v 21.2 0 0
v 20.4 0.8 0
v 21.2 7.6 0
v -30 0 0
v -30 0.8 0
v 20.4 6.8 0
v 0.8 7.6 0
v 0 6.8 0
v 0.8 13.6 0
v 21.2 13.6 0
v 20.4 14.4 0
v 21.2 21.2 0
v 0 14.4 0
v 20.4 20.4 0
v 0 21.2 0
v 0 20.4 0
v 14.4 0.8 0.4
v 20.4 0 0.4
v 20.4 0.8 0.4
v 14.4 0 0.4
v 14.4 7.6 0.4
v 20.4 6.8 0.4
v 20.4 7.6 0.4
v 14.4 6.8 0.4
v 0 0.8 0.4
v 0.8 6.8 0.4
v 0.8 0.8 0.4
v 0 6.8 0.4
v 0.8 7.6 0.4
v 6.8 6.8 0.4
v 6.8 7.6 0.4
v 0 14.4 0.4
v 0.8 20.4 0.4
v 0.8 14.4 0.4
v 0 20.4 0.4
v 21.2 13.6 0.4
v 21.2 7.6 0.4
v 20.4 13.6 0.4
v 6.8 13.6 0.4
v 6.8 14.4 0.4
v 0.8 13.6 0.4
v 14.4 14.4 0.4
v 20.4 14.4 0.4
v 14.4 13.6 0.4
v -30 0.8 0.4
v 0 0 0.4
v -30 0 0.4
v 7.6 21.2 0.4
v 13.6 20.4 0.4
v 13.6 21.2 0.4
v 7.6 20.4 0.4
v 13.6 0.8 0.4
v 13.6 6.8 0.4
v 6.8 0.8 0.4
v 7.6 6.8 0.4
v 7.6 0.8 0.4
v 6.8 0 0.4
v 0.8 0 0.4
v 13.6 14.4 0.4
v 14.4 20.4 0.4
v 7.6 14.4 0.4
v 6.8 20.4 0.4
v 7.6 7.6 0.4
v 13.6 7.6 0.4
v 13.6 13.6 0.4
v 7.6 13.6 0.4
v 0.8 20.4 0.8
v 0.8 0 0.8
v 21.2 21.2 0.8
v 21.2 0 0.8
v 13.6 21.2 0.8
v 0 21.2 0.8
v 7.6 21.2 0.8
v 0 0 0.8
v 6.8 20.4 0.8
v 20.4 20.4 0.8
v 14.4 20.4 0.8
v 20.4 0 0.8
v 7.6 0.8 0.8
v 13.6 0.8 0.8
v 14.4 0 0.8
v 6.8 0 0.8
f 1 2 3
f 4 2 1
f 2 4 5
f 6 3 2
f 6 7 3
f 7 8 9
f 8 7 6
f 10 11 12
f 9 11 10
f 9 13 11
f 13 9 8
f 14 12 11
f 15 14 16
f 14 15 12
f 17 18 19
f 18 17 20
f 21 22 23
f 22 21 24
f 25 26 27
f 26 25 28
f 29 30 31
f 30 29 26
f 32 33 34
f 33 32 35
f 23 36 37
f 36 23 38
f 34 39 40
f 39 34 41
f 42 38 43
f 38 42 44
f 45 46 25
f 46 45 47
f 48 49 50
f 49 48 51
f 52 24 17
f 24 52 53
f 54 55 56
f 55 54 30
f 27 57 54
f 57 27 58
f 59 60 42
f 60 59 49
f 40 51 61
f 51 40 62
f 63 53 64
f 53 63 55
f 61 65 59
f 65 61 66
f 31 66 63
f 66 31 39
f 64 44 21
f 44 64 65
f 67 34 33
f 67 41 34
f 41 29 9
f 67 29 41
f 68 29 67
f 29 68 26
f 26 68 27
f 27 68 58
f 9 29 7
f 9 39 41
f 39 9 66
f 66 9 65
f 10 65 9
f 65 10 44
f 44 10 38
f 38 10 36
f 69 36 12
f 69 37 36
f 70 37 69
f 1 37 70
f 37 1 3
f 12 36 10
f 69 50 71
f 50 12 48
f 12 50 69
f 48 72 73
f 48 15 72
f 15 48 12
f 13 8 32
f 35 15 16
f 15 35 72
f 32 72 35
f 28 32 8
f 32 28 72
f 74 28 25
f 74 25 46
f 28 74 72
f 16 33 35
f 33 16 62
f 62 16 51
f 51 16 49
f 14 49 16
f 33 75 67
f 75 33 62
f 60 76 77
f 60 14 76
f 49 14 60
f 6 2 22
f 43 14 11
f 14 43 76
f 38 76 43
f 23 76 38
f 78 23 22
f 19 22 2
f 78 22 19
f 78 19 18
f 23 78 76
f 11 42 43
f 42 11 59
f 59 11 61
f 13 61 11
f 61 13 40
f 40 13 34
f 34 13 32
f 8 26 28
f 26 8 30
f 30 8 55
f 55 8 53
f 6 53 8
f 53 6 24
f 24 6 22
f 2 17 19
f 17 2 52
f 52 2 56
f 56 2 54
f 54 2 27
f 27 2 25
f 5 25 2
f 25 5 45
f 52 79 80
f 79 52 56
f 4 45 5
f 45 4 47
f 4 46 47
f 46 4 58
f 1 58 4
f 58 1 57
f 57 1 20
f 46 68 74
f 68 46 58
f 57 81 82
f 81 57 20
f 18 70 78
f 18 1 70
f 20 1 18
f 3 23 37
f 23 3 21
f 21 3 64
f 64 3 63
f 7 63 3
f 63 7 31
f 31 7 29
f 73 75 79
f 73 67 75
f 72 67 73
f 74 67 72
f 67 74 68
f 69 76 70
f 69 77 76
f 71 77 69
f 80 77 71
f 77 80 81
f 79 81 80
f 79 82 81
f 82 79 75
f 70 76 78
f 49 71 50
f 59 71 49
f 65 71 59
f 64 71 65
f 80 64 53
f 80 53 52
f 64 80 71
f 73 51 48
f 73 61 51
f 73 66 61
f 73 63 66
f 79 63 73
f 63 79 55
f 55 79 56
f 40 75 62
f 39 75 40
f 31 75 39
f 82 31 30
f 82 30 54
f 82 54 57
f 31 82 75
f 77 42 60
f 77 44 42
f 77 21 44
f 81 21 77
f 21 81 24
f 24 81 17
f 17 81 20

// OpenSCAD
// file: ../../api/v3/reporting.scad
//////////////////////////////////////////////////////////////////////
// LibFile: reporting.scad
// Project: Grid Stack
// FileGroup: API v3 Reporting
// FileSummary: Console report for immutable direct and positive-gap coupons.
// Role: Records the exact environment, dimensions, support strategy, path
//       lengths, qualification status, and deposited-layer counts.
// Requires: API v3 indexes, mathematics, and path generator.
// Exports: report_structural_coupon_object().
//////////////////////////////////////////////////////////////////////

function _bridge_status3(span, process) =
    span <= process[PX3_BRIDGE_MAX]
        ? "within_owner_tested_limit"
        : "exploratory_beyond_owner_tested_limit";

module report_structural_coupon_object(object, report_level = "full") {
    material = object[SCO_MATERIAL];
    nozzle = object[SCO_NOZZLE];
    printer = object[SCO_PRINTER];
    process = object[SCO_PROCESS];
    boundary = object[SCO_BOUNDARY];
    gap = object[SCO_CLEAR_GAP];
    strategy = object[SCO_SUPPORT_STRATEGY];

    echo("--- Grid Stack immutable structural coupon ---");
    echo(str("Object: ", object[SCO_NAME], " revision ", object[SCO_REVISION]));
    echo(str("API/schema: ", object[SCO_REQUIRED_API], "/",
        object[SCO_SCHEMA_VERSION]));
    echo(str("Release/base commit: ", object[SCO_SOURCE_RELEASE], " / ",
        object[SCO_FRAMEWORK_BASE_COMMIT]));
    echo(str("Material/nozzle/printer: ", material[MAT3_FAMILY], " / ",
        nozzle[NZ3_DIAMETER], " mm / ", printer[PRN3_NAME]));
    echo(str("Cells: ", boundary[B3_CELLS_X], " x ", boundary[B3_CELLS_Y]));
    echo(str("Clear spans: ", boundary[B3_CLEAR_SPAN_X], " x ",
        boundary[B3_CLEAR_SPAN_Y], " mm"));
    echo(str("Span status: ",
        _bridge_status3(boundary[B3_CLEAR_SPAN_X], process)));
    echo(str("Outside size: ", boundary_size_x3(boundary, process, nozzle),
        " x ", boundary_size_y3(boundary, process, nozzle), " mm"));
    echo(str("Primitive trace: ", trace_width3(nozzle), " x ",
        trace_height3(process), " mm"));
    echo(str("Structural strand: ", strand_width3(process, nozzle), " x ",
        strand_height3(process), " mm"));
    echo(str("Clear vertical gap: ", gap, " mm"));
    echo(str("Support strategy: ", strategy));
    echo(str("Total modeled height: ", coupon_total_height3(object), " mm"));

    if (report_level == "full") {
        if (strategy == "direct_orthogonal") {
            lower = coupon_path(
                boundary, process, nozzle, 0, object[SCO_LEAD_IN]
            );
            upper = coupon_path(boundary, process, nozzle, 90, 0);
            echo(str("Lower/upper path lengths: ", path_length3(lower),
                " / ", path_length3(upper), " mm"));
            echo(str("Deposited layers: ", 2 * process[PX3_HEIGHT_PASSES]));
        }
        else {
            witness = coupon_path(
                boundary, process, nozzle, 90, object[SCO_LEAD_IN]
            );
            riser = coupon_path(boundary, process, nozzle, 0, 0);
            test = coupon_path(boundary, process, nozzle, 90, 0);
            echo(str("Witness/riser/test path lengths: ",
                path_length3(witness), " / ", path_length3(riser), " / ",
                path_length3(test), " mm"));
            echo(str("Riser deposited layers: ", round(gap_layer_count3(object))));
            echo(str("Total deposited layers: ",
                2 * process[PX3_HEIGHT_PASSES] +
                round(gap_layer_count3(object))));
        }
        echo(str("Status: ", object[SCO_STATUS]));
        echo(str("Notes: ", object[SCO_NOTES]));
    }
}
// file: ../../api/v3/validation.scad
//////////////////////////////////////////////////////////////////////
// LibFile: validation.scad
// Project: Grid Stack
// FileGroup: API v3 Validation
// FileSummary: Validates immutable environment records, count boundaries,
//              support strategy, path continuity, and layer quantization.
// Role: Rejects incompatible or physically floating recipes before geometry
//       is generated.
// Requires: API v3 indexes, mathematics, and path generator.
// Exports: validate_structural_coupon_object().
//////////////////////////////////////////////////////////////////////

module _validate_path3(points, boundary, orientation, lead_in) {
    run_count = orientation == 0
        ? boundary_strand_count_y3(boundary)
        : boundary_strand_count_x3(boundary);

    assert(len(points) == expected_coupon_point_count3(run_count, lead_in),
        "API v3 coupon path has an unexpected point count.");
    assert(!path_has_zero_segment3(points),
        "API v3 coupon path contains a zero-length segment.");
    assert(path_axis_aligned3(points),
        "API v3 coupon path must remain axis-aligned.");
    assert(points[0] != points[len(points) - 1],
        "API v3 coupon path must remain open.");
}

module validate_structural_coupon_object(object) {
    assert(object[SCO_REQUIRED_API] == GRID_STACK_API_VERSION,
        "Saved coupon requires a different Grid Stack API version.");
    assert(object[SCO_SCHEMA_VERSION] == GRID_STACK_COUPON_SCHEMA_VERSION,
        "Saved coupon requires a different coupon schema version.");
    assert(GRID_STACK_RECTANGULAR_FRAMEWORK_VERSION == 2,
        "Saved coupon requires rectangular framework version 2.");

    material = object[SCO_MATERIAL];
    nozzle = object[SCO_NOZZLE];
    printer = object[SCO_PRINTER];
    process = object[SCO_PROCESS];
    boundary = object[SCO_BOUNDARY];
    gap = object[SCO_CLEAR_GAP];
    lead_in = object[SCO_LEAD_IN];
    strategy = object[SCO_SUPPORT_STRATEGY];

    assert(nozzle[NZ3_DIAMETER] > 0,
        "Saved coupon nozzle diameter must be positive.");
    assert(process[PX3_LAYER_H] > 0,
        "Saved coupon layer height must be positive.");
    assert(process[PX3_WIDTH_PASSES] >= 2,
        "Saved coupon structural width requires at least two passes.");
    assert(process[PX3_HEIGHT_PASSES] >= 2,
        "Saved coupon structural height requires at least two layers.");
    assert(process[PX3_MATERIAL] == material[MAT3_NAME],
        "Saved coupon process/material references do not match.");
    assert(process[PX3_NOZZLE] == nozzle[NZ3_NAME],
        "Saved coupon process/nozzle references do not match.");
    assert(process[PX3_PRINTER] == printer[PRN3_NAME],
        "Saved coupon process/printer references do not match.");
    assert(boundary[B3_CELLS_X] > 0 && boundary[B3_CELLS_Y] > 0,
        "Saved coupon cell counts must be positive.");
    assert(boundary[B3_CLEAR_SPAN_X] > 0 &&
           boundary[B3_CLEAR_SPAN_Y] > 0,
        "Saved coupon clear spans must be positive.");
    assert(lead_in >= 0,
        "Saved coupon lead-in cannot be negative.");
    assert(gap >= 0,
        "Saved coupon clear gap cannot be negative.");
    assert(nearly_equal3(gap_layer_count3(object), round(gap_layer_count3(object))),
        "Saved coupon clear gap must equal a whole deposited-layer count.");
    assert(
        (strategy == "direct_orthogonal" && nearly_equal3(gap, 0)) ||
        (strategy == "witness_riser_bridge" && gap > 0),
        "Saved coupon support strategy does not match its clear gap."
    );

    if (strategy == "direct_orthogonal") {
        lower = coupon_path(boundary, process, nozzle, 0, lead_in);
        upper = coupon_path(boundary, process, nozzle, 90, 0);
        _validate_path3(lower, boundary, 0, lead_in);
        _validate_path3(upper, boundary, 90, 0);
        entry = lead_in > 0 ? 1 : 0;
        assert(nearly_equal3(point_distance_2d3(lower[entry], upper[0]), 0),
            "Direct upper path must start on the lower entry crossing.");
    }
    else {
        witness = coupon_path(boundary, process, nozzle, 90, lead_in);
        riser = coupon_path(boundary, process, nozzle, 0, 0);
        test = coupon_path(boundary, process, nozzle, 90, 0);
        _validate_path3(witness, boundary, 90, lead_in);
        _validate_path3(riser, boundary, 0, 0);
        _validate_path3(test, boundary, 90, 0);
        entry = lead_in > 0 ? 1 : 0;
        assert(nearly_equal3(point_distance_2d3(witness[entry], riser[0]), 0),
            "Riser path must start on the witness entry crossing.");
        assert(nearly_equal3(point_distance_2d3(riser[0], test[0]), 0),
            "Upper test path must start on the riser entry crossing.");
        for (i = [0 : len(test) - 1])
            assert(nearly_equal3(point_distance_2d3(test[i], witness[i + entry]), 0),
                "Upper test path must align directly above the witness path.");
    }

    echo("GRID STACK API V3 COUPON VALIDATION: PASS");
}
// file: ../../api/v3/geometry.scad
//////////////////////////////////////////////////////////////////////
// LibFile: geometry.scad
// Project: Grid Stack
// FileGroup: API v3 Printable Geometry
// FileSummary: Creates square-ended structural paths, direct-contact coupons,
//              positive witness/riser/bridge coupons, and simple diagnostics.
// Role: Supplies all geometry used by immutable API v3 recipes without
//       importing mutable workbench geometry.
// Requires: API v3 mathematics and ordered axis-aligned paths.
// Exports: render_direct_coupon(), render_positive_gap_coupon(), and
//          render_coupon_path_debug().
//////////////////////////////////////////////////////////////////////

module _segment_2d3(a, b, width) {
    horizontal = nearly_equal3(a[1], b[1]);
    vertical = nearly_equal3(a[0], b[0]);

    assert(horizontal || vertical,
        "API v3 printable segments must be horizontal or vertical.");
    assert(!nearly_equal3(point_distance_2d3(a, b), 0),
        "API v3 printable segments must have nonzero length.");

    if (horizontal)
        translate([min(a[0], b[0]) - width / 2, a[1] - width / 2])
            square([abs(b[0] - a[0]) + width, width]);
    else
        translate([a[0] - width / 2, min(a[1], b[1]) - width / 2])
            square([width, abs(b[1] - a[1]) + width]);
}

module _path_2d3(points, width) {
    union()
        for (i = [0 : len(points) - 2])
            _segment_2d3(points[i], points[i + 1], width);
}

module _structural_path3(points, process, nozzle) {
    linear_extrude(height = strand_height3(process), convexity = 10)
        _path_2d3(points, strand_width3(process, nozzle));
}

module render_direct_coupon(lower, upper, process, nozzle) {
    union() {
        _structural_path3(lower, process, nozzle);
        translate([0, 0, strand_height3(process)])
            _structural_path3(upper, process, nozzle);
    }
}

module render_positive_gap_coupon(
    witness, riser, test, process, nozzle, clear_gap
) {
    union() {
        _structural_path3(witness, process, nozzle);

        translate([0, 0, strand_height3(process)])
            linear_extrude(height = clear_gap, convexity = 10)
                _path_2d3(riser, strand_width3(process, nozzle));

        translate([0, 0, strand_height3(process) + clear_gap])
            _structural_path3(test, process, nozzle);
    }
}

module _debug_path3(points, z, width) {
    translate([0, 0, z])
        linear_extrude(height = 0.04)
            _path_2d3(points, width);
}

module render_coupon_path_debug(
    lower, upper, riser, process, clear_gap = 0
) {
    width = max(0.12, trace_height3(process));
    _debug_path3(lower, 0, width);
    if (len(riser) > 0)
        _debug_path3(riser, strand_height3(process), width);
    _debug_path3(
        upper,
        strand_height3(process) + clear_gap,
        width
    );
}
// file: ../../api/v3/paths.scad
//////////////////////////////////////////////////////////////////////
// LibFile: paths.scad
// Project: Grid Stack
// FileGroup: API v3 Path Generation
// FileSummary: Generates one open rectangular serpentine centerline from a
//              count boundary for X- or Y-running structural paths.
// Role: Preserves parallel runs, square connectors, optional single lead-in,
//       and one uninterrupted ordered point list per deposited layer.
// Requires: API v3 indexes and mathematics.
// Exports: coupon_path() and expected_coupon_point_count3().
//////////////////////////////////////////////////////////////////////

function _x_rows3(row, count, x_min, x_max, y_min, pitch) =
    row >= count
        ? []
        : let(
            y = y_min + row * pitch,
            x_end = row % 2 == 0 ? x_max : x_min,
            row_end = [x_end, y],
            connector_end = [x_end, y + pitch]
        )
        concat(
            [row_end],
            row < count - 1 ? [connector_end] : [],
            _x_rows3(row + 1, count, x_min, x_max, y_min, pitch)
        );

function _y_columns3(column, count, x_min, y_min, y_max, pitch) =
    column >= count
        ? []
        : let(
            x = x_min + column * pitch,
            y_end = column % 2 == 0 ? y_max : y_min,
            column_end = [x, y_end],
            connector_end = [x + pitch, y_end]
        )
        concat(
            [column_end],
            column < count - 1 ? [connector_end] : [],
            _y_columns3(column + 1, count, x_min, y_min, y_max, pitch)
        );

function expected_coupon_point_count3(run_count, lead_in = 0) =
    2 * run_count + (lead_in > 0 ? 1 : 0);

function coupon_path(
    boundary, process, nozzle, orientation = 0, lead_in = 0
) =
    assert(orientation == 0 || orientation == 90,
        "API v3 coupon orientation must be 0 or 90 degrees.")
    assert(lead_in >= 0,
        "API v3 coupon lead-in cannot be negative.")
    let(
        width = strand_width3(process, nozzle),
        x_min = width / 2,
        y_min = width / 2,
        x_max = boundary_size_x3(boundary, process, nozzle) - width / 2,
        y_max = boundary_size_y3(boundary, process, nozzle) - width / 2,
        entry = [x_min, y_min],
        prefix = lead_in > 0
            ? (orientation == 0
                ? [[x_min - lead_in, y_min], entry]
                : [[x_min, y_min - lead_in], entry])
            : [entry]
    )
    orientation == 0
        ? concat(
            prefix,
            _x_rows3(
                0, boundary_strand_count_y3(boundary),
                x_min, x_max, y_min,
                boundary_pitch_y3(boundary, process, nozzle)
            )
        )
        : concat(
            prefix,
            _y_columns3(
                0, boundary_strand_count_x3(boundary),
                x_min, y_min, y_max,
                boundary_pitch_x3(boundary, process, nozzle)
            )
        );
// file: ../../api/v3/math.scad
//////////////////////////////////////////////////////////////////////
// LibFile: math.scad
// Project: Grid Stack
// FileGroup: API v3 Mathematics
// FileSummary: Pure trace, strand, boundary, path, and layer-count helpers.
// Role: Keeps API v3 calculations isolated and reproducible without importing
//       mutable workbench mathematics.
// Requires: API v3 indexes.
// Exports: nearly_equal3(), trace/strand dimensions, boundary dimensions,
//          path inspection, gap-layer count, and total-height helpers.
//////////////////////////////////////////////////////////////////////

function nearly_equal3(a, b, epsilon = 0.000001) = abs(a - b) <= epsilon;

function trace_width3(nozzle) = nozzle[NZ3_DIAMETER];
function trace_height3(process) = process[PX3_LAYER_H];
function strand_width3(process, nozzle) =
    trace_width3(nozzle) * process[PX3_WIDTH_PASSES];
function strand_height3(process) =
    trace_height3(process) * process[PX3_HEIGHT_PASSES];

function boundary_strand_count_x3(boundary) = boundary[B3_CELLS_X] + 1;
function boundary_strand_count_y3(boundary) = boundary[B3_CELLS_Y] + 1;
function boundary_pitch_x3(boundary, process, nozzle) =
    boundary[B3_CLEAR_SPAN_X] + strand_width3(process, nozzle);
function boundary_pitch_y3(boundary, process, nozzle) =
    boundary[B3_CLEAR_SPAN_Y] + strand_width3(process, nozzle);
function boundary_size_x3(boundary, process, nozzle) =
    boundary[B3_CELLS_X] * boundary[B3_CLEAR_SPAN_X] +
    boundary_strand_count_x3(boundary) * strand_width3(process, nozzle);
function boundary_size_y3(boundary, process, nozzle) =
    boundary[B3_CELLS_Y] * boundary[B3_CLEAR_SPAN_Y] +
    boundary_strand_count_y3(boundary) * strand_width3(process, nozzle);

function point_distance_2d3(a, b) =
    sqrt(pow(b[0] - a[0], 2) + pow(b[1] - a[1], 2));
function path_length3(points, i = 0) =
    i >= len(points) - 1
        ? 0
        : point_distance_2d3(points[i], points[i + 1]) +
          path_length3(points, i + 1);
function path_has_zero_segment3(points, i = 0) =
    i >= len(points) - 1
        ? false
        : nearly_equal3(point_distance_2d3(points[i], points[i + 1]), 0)
            ? true
            : path_has_zero_segment3(points, i + 1);
function segment_axis_aligned3(a, b) =
    nearly_equal3(a[0], b[0]) || nearly_equal3(a[1], b[1]);
function path_axis_aligned3(points, i = 0) =
    i >= len(points) - 1
        ? true
        : segment_axis_aligned3(points[i], points[i + 1]) &&
          path_axis_aligned3(points, i + 1);

function gap_layer_count3(object) =
    object[SCO_CLEAR_GAP] / trace_height3(object[SCO_PROCESS]);
function coupon_total_height3(object) =
    2 * strand_height3(object[SCO_PROCESS]) + object[SCO_CLEAR_GAP];
// file: ../../api/v3/schema.scad
//////////////////////////////////////////////////////////////////////
// LibFile: schema.scad
// Project: Grid Stack
// FileGroup: API v3 Data Model
// FileSummary: Constructors for self-contained immutable structural coupons.
// Role: Makes every geometry-affecting environment and object value explicit
//       inside the saved recipe rather than resolving mutable catalog names.
// Exports: material_spec(), nozzle_spec(), printer_spec(),
//          structural_process_profile(), count_boundary(), and
//          structural_coupon_object().
//////////////////////////////////////////////////////////////////////

function material_spec(
    name, family, flexibility, status = "in_use", notes = ""
) = [name, family, flexibility, status, notes];

function nozzle_spec(
    name, diameter, construction = "brass", status = "in_use", notes = ""
) = [name, diameter, construction, status, notes];

function printer_spec(
    name,
    manufacturer = "",
    model = "",
    motion_system = "",
    build_surface = "",
    status = "unrecorded",
    notes = ""
) = [
    name, manufacturer, model, motion_system,
    build_surface, status, notes
];

function structural_process_profile(
    name,
    material_name,
    nozzle_name,
    printer_name,
    layer_height,
    width_passes,
    height_passes,
    bridge_max,
    qualification,
    revision,
    notes = ""
) = [
    name, material_name, nozzle_name, printer_name,
    layer_height, width_passes, height_passes, bridge_max,
    qualification, revision, notes
];

// Function: count_boundary()
// Synopsis: Stores clear-opening counts and clear spans for one rectangle.
function count_boundary(
    name,
    cells_x,
    cells_y,
    clear_span_x,
    clear_span_y,
    notes = ""
) = [name, cells_x, cells_y, clear_span_x, clear_span_y, notes];

// Function: structural_coupon_object()
// Synopsis: Constructs one permanent coupon recipe.
// Description:
//   framework_base_commit records the last accepted repository state used to
//   begin the API implementation. The Git commit containing this recipe is the
//   authoritative complete source; a file cannot embed its own future hash.
function structural_coupon_object(
    name,
    revision,
    required_api_version,
    coupon_schema_version,
    source_release,
    framework_base_commit,
    material,
    nozzle,
    printer,
    process,
    boundary,
    clear_vertical_gap,
    lead_in,
    support_strategy,
    status = "calibration",
    notes = ""
) = [
    name,
    revision,
    required_api_version,
    coupon_schema_version,
    source_release,
    framework_base_commit,
    material,
    nozzle,
    printer,
    process,
    boundary,
    clear_vertical_gap,
    lead_in,
    support_strategy,
    status,
    notes
];
// file: ../../api/v3/indices.scad
//////////////////////////////////////////////////////////////////////
// LibFile: indices.scad
// Project: Grid Stack
// FileGroup: API v3 Data Model
// FileSummary: Named indexes for immutable structural-coupon records.
// Role: Prevents unexplained numeric indexes from entering saved recipes and
//       keeps API version 3 independent of mutable workbench indexes.
// Exports: MAT3_*, NZ3_*, PRN3_*, PX3_*, B3_*, and SCO_* constants.
//////////////////////////////////////////////////////////////////////

MAT3_NAME = 0;
MAT3_FAMILY = 1;
MAT3_FLEXIBILITY = 2;
MAT3_STATUS = 3;
MAT3_NOTES = 4;

NZ3_NAME = 0;
NZ3_DIAMETER = 1;
NZ3_CONSTRUCTION = 2;
NZ3_STATUS = 3;
NZ3_NOTES = 4;

PRN3_NAME = 0;
PRN3_MANUFACTURER = 1;
PRN3_MODEL = 2;
PRN3_MOTION_SYSTEM = 3;
PRN3_BUILD_SURFACE = 4;
PRN3_STATUS = 5;
PRN3_NOTES = 6;

PX3_NAME = 0;
PX3_MATERIAL = 1;
PX3_NOZZLE = 2;
PX3_PRINTER = 3;
PX3_LAYER_H = 4;
PX3_WIDTH_PASSES = 5;
PX3_HEIGHT_PASSES = 6;
PX3_BRIDGE_MAX = 7;
PX3_QUALIFICATION = 8;
PX3_REVISION = 9;
PX3_NOTES = 10;

B3_NAME = 0;
B3_CELLS_X = 1;
B3_CELLS_Y = 2;
B3_CLEAR_SPAN_X = 3;
B3_CLEAR_SPAN_Y = 4;
B3_NOTES = 5;

SCO_NAME = 0;
SCO_REVISION = 1;
SCO_REQUIRED_API = 2;
SCO_SCHEMA_VERSION = 3;
SCO_SOURCE_RELEASE = 4;
SCO_FRAMEWORK_BASE_COMMIT = 5;
SCO_MATERIAL = 6;
SCO_NOZZLE = 7;
SCO_PRINTER = 8;
SCO_PROCESS = 9;
SCO_BOUNDARY = 10;
SCO_CLEAR_GAP = 11;
SCO_LEAD_IN = 12;
SCO_SUPPORT_STRATEGY = 13;
SCO_STATUS = 14;
SCO_NOTES = 15;
// file: ../../api/grid_stack_v3.scad
//////////////////////////////////////////////////////////////////////
// LibFile: grid_stack_v3.scad
// Project: Grid Stack
// FileGroup: Versioned Public Interface
// FileSummary: Immutable API version 3 for rectangular count-boundary
//              structural coupons, including positive witness/riser gaps.
// Role: Reconstructs saved coupon recipes without Customizer state or mutable
//       workbench catalogs. Incompatible behavior requires a new API file.
// Exports: API/schema constants, record constructors, validation, reporting,
//          and structural_coupon_render().
//////////////////////////////////////////////////////////////////////

GRID_STACK_API_VERSION = 3;
GRID_STACK_COUPON_SCHEMA_VERSION = 1;
GRID_STACK_RECTANGULAR_FRAMEWORK_VERSION = 2;
GRID_STACK_RELEASE = "1.0.0";

include <v3/indices.scad>
include <v3/schema.scad>
include <v3/math.scad>
include <v3/paths.scad>
include <v3/geometry.scad>
include <v3/validation.scad>
include <v3/reporting.scad>

// Module: structural_coupon_render()
// Synopsis: Validates, reports, and renders one immutable coupon recipe.
// Arguments:
//   object = Record returned by structural_coupon_object().
//   mode = print, path_debug, or report_only.
//   report_level = summary or full.
module structural_coupon_render(
    object,
    mode = "print",
    report_level = "full"
) {
    validate_structural_coupon_object(object);
    report_structural_coupon_object(object, report_level);

    boundary = object[SCO_BOUNDARY];
    process = object[SCO_PROCESS];
    nozzle = object[SCO_NOZZLE];
    lead_in = object[SCO_LEAD_IN];
    clear_gap = object[SCO_CLEAR_GAP];
    strategy = object[SCO_SUPPORT_STRATEGY];

    if (strategy == "direct_orthogonal") {
        lower = coupon_path(boundary, process, nozzle, 0, lead_in);
        upper = coupon_path(boundary, process, nozzle, 90, 0);

        if (mode == "print")
            render_direct_coupon(lower, upper, process, nozzle);
        else if (mode == "path_debug")
            render_coupon_path_debug(lower, upper, [], process);
        else if (mode == "report_only")
            echo("Grid Stack API v3 report-only mode: no geometry generated.");
        else
            assert(false, str("Unknown API v3 render mode: ", mode));
    }
    else if (strategy == "witness_riser_bridge") {
        witness = coupon_path(boundary, process, nozzle, 90, lead_in);
        riser = coupon_path(boundary, process, nozzle, 0, 0);
        test = coupon_path(boundary, process, nozzle, 90, 0);

        if (mode == "print")
            render_positive_gap_coupon(
                witness, riser, test, process, nozzle, clear_gap
            );
        else if (mode == "path_debug")
            render_coupon_path_debug(witness, test, riser, process, clear_gap);
        else if (mode == "report_only")
            echo("Grid Stack API v3 report-only mode: no geometry generated.");
        else
            assert(false, str("Unknown API v3 render mode: ", mode));
    }
    else
        assert(false, str("Unknown coupon support strategy: ", strategy));
}
// main file
//////////////////////////////////////////////////////////////////////
// LibFile: coupon-3x3-span6-gap0-direct-pla-plus-0p4-v1.scad
// Project: Grid Stack
// FileGroup: Immutable Structural Coupon
// FileSummary: 3 x 3 PLA+ coupon with 6 mm clear XY spans and 0 mm
//              clear vertical gap using direct_orthogonal geometry.
// Role: Permanently reconstructs one calibration object without Customizer
//       state or mutable workbench catalog lookup.
// FrameworkBaseCommit: 4b5e564
// Requires: Grid Stack API version 3 and coupon schema version 1.
// Output: Printable continuous-path structural coupon geometry.
//////////////////////////////////////////////////////////////////////

include <../../api/grid_stack_v3.scad>

assert(GRID_STACK_API_VERSION == 3,
    "This recipe requires Grid Stack API version 3.");
assert(GRID_STACK_COUPON_SCHEMA_VERSION == 1,
    "This recipe requires coupon schema version 1.");
assert(GRID_STACK_RECTANGULAR_FRAMEWORK_VERSION == 2,
    "This recipe requires rectangular framework version 2.");

saved_material = material_spec(
    name = "PLA_PLUS",
    family = "PLA+",
    flexibility = "rigid",
    status = "in_use",
    notes = "Exact material family selected for the coupon matrix."
);

saved_nozzle = nozzle_spec(
    name = "BRASS_0P4",
    diameter = 0.4,
    construction = "brass",
    status = "in_use",
    notes = "Nominal nozzle diameter used to derive the 0.8 mm strand width."
);

saved_printer = printer_spec(
    name = "UNRECORDED_PRINTER_R1",
    manufacturer = "",
    model = "",
    motion_system = "",
    build_surface = "",
    status = "unrecorded",
    notes = "Printer identity was not frozen with this coupon framework."
);

saved_process = structural_process_profile(
    name = "PLA_PLUS_0P4_LH0P2_W2_H2_R1",
    material_name = "PLA_PLUS",
    nozzle_name = "BRASS_0P4",
    printer_name = "UNRECORDED_PRINTER_R1",
    layer_height = 0.2,
    width_passes = 2,
    height_passes = 2,
    bridge_max = 6,
    qualification = "owner_tested_to_6mm",
    revision = 1,
    notes = "Primitive trace 0.4 x 0.2 mm; structural strand 0.8 x 0.4 mm."
);

saved_boundary = count_boundary(
    name = "COUNT_3X3_SPAN6",
    cells_x = 3,
    cells_y = 3,
    clear_span_x = 6,
    clear_span_y = 6,
    notes = "Outside dimensions derive from four strands and three clear openings."
);

saved_coupon = structural_coupon_object(
    name = "COUPON_3X3_SPAN6_GAP0_DIRECT_PLA_PLUS_0P4_V1",
    revision = 1,
    required_api_version = 3,
    coupon_schema_version = 1,
    source_release = "1.0.0",
    framework_base_commit = "4b5e564",
    material = saved_material,
    nozzle = saved_nozzle,
    printer = saved_printer,
    process = saved_process,
    boundary = saved_boundary,
    clear_vertical_gap = 0,
    lead_in = 30,
    support_strategy = "direct_orthogonal",
    status = "printed_reference",
    notes = "Geometry matches the physically accepted direct-contact coupon at commit 06f7cdd."
);

structural_coupon_render(
    saved_coupon,
    mode = "print",
    report_level = "full"
);
